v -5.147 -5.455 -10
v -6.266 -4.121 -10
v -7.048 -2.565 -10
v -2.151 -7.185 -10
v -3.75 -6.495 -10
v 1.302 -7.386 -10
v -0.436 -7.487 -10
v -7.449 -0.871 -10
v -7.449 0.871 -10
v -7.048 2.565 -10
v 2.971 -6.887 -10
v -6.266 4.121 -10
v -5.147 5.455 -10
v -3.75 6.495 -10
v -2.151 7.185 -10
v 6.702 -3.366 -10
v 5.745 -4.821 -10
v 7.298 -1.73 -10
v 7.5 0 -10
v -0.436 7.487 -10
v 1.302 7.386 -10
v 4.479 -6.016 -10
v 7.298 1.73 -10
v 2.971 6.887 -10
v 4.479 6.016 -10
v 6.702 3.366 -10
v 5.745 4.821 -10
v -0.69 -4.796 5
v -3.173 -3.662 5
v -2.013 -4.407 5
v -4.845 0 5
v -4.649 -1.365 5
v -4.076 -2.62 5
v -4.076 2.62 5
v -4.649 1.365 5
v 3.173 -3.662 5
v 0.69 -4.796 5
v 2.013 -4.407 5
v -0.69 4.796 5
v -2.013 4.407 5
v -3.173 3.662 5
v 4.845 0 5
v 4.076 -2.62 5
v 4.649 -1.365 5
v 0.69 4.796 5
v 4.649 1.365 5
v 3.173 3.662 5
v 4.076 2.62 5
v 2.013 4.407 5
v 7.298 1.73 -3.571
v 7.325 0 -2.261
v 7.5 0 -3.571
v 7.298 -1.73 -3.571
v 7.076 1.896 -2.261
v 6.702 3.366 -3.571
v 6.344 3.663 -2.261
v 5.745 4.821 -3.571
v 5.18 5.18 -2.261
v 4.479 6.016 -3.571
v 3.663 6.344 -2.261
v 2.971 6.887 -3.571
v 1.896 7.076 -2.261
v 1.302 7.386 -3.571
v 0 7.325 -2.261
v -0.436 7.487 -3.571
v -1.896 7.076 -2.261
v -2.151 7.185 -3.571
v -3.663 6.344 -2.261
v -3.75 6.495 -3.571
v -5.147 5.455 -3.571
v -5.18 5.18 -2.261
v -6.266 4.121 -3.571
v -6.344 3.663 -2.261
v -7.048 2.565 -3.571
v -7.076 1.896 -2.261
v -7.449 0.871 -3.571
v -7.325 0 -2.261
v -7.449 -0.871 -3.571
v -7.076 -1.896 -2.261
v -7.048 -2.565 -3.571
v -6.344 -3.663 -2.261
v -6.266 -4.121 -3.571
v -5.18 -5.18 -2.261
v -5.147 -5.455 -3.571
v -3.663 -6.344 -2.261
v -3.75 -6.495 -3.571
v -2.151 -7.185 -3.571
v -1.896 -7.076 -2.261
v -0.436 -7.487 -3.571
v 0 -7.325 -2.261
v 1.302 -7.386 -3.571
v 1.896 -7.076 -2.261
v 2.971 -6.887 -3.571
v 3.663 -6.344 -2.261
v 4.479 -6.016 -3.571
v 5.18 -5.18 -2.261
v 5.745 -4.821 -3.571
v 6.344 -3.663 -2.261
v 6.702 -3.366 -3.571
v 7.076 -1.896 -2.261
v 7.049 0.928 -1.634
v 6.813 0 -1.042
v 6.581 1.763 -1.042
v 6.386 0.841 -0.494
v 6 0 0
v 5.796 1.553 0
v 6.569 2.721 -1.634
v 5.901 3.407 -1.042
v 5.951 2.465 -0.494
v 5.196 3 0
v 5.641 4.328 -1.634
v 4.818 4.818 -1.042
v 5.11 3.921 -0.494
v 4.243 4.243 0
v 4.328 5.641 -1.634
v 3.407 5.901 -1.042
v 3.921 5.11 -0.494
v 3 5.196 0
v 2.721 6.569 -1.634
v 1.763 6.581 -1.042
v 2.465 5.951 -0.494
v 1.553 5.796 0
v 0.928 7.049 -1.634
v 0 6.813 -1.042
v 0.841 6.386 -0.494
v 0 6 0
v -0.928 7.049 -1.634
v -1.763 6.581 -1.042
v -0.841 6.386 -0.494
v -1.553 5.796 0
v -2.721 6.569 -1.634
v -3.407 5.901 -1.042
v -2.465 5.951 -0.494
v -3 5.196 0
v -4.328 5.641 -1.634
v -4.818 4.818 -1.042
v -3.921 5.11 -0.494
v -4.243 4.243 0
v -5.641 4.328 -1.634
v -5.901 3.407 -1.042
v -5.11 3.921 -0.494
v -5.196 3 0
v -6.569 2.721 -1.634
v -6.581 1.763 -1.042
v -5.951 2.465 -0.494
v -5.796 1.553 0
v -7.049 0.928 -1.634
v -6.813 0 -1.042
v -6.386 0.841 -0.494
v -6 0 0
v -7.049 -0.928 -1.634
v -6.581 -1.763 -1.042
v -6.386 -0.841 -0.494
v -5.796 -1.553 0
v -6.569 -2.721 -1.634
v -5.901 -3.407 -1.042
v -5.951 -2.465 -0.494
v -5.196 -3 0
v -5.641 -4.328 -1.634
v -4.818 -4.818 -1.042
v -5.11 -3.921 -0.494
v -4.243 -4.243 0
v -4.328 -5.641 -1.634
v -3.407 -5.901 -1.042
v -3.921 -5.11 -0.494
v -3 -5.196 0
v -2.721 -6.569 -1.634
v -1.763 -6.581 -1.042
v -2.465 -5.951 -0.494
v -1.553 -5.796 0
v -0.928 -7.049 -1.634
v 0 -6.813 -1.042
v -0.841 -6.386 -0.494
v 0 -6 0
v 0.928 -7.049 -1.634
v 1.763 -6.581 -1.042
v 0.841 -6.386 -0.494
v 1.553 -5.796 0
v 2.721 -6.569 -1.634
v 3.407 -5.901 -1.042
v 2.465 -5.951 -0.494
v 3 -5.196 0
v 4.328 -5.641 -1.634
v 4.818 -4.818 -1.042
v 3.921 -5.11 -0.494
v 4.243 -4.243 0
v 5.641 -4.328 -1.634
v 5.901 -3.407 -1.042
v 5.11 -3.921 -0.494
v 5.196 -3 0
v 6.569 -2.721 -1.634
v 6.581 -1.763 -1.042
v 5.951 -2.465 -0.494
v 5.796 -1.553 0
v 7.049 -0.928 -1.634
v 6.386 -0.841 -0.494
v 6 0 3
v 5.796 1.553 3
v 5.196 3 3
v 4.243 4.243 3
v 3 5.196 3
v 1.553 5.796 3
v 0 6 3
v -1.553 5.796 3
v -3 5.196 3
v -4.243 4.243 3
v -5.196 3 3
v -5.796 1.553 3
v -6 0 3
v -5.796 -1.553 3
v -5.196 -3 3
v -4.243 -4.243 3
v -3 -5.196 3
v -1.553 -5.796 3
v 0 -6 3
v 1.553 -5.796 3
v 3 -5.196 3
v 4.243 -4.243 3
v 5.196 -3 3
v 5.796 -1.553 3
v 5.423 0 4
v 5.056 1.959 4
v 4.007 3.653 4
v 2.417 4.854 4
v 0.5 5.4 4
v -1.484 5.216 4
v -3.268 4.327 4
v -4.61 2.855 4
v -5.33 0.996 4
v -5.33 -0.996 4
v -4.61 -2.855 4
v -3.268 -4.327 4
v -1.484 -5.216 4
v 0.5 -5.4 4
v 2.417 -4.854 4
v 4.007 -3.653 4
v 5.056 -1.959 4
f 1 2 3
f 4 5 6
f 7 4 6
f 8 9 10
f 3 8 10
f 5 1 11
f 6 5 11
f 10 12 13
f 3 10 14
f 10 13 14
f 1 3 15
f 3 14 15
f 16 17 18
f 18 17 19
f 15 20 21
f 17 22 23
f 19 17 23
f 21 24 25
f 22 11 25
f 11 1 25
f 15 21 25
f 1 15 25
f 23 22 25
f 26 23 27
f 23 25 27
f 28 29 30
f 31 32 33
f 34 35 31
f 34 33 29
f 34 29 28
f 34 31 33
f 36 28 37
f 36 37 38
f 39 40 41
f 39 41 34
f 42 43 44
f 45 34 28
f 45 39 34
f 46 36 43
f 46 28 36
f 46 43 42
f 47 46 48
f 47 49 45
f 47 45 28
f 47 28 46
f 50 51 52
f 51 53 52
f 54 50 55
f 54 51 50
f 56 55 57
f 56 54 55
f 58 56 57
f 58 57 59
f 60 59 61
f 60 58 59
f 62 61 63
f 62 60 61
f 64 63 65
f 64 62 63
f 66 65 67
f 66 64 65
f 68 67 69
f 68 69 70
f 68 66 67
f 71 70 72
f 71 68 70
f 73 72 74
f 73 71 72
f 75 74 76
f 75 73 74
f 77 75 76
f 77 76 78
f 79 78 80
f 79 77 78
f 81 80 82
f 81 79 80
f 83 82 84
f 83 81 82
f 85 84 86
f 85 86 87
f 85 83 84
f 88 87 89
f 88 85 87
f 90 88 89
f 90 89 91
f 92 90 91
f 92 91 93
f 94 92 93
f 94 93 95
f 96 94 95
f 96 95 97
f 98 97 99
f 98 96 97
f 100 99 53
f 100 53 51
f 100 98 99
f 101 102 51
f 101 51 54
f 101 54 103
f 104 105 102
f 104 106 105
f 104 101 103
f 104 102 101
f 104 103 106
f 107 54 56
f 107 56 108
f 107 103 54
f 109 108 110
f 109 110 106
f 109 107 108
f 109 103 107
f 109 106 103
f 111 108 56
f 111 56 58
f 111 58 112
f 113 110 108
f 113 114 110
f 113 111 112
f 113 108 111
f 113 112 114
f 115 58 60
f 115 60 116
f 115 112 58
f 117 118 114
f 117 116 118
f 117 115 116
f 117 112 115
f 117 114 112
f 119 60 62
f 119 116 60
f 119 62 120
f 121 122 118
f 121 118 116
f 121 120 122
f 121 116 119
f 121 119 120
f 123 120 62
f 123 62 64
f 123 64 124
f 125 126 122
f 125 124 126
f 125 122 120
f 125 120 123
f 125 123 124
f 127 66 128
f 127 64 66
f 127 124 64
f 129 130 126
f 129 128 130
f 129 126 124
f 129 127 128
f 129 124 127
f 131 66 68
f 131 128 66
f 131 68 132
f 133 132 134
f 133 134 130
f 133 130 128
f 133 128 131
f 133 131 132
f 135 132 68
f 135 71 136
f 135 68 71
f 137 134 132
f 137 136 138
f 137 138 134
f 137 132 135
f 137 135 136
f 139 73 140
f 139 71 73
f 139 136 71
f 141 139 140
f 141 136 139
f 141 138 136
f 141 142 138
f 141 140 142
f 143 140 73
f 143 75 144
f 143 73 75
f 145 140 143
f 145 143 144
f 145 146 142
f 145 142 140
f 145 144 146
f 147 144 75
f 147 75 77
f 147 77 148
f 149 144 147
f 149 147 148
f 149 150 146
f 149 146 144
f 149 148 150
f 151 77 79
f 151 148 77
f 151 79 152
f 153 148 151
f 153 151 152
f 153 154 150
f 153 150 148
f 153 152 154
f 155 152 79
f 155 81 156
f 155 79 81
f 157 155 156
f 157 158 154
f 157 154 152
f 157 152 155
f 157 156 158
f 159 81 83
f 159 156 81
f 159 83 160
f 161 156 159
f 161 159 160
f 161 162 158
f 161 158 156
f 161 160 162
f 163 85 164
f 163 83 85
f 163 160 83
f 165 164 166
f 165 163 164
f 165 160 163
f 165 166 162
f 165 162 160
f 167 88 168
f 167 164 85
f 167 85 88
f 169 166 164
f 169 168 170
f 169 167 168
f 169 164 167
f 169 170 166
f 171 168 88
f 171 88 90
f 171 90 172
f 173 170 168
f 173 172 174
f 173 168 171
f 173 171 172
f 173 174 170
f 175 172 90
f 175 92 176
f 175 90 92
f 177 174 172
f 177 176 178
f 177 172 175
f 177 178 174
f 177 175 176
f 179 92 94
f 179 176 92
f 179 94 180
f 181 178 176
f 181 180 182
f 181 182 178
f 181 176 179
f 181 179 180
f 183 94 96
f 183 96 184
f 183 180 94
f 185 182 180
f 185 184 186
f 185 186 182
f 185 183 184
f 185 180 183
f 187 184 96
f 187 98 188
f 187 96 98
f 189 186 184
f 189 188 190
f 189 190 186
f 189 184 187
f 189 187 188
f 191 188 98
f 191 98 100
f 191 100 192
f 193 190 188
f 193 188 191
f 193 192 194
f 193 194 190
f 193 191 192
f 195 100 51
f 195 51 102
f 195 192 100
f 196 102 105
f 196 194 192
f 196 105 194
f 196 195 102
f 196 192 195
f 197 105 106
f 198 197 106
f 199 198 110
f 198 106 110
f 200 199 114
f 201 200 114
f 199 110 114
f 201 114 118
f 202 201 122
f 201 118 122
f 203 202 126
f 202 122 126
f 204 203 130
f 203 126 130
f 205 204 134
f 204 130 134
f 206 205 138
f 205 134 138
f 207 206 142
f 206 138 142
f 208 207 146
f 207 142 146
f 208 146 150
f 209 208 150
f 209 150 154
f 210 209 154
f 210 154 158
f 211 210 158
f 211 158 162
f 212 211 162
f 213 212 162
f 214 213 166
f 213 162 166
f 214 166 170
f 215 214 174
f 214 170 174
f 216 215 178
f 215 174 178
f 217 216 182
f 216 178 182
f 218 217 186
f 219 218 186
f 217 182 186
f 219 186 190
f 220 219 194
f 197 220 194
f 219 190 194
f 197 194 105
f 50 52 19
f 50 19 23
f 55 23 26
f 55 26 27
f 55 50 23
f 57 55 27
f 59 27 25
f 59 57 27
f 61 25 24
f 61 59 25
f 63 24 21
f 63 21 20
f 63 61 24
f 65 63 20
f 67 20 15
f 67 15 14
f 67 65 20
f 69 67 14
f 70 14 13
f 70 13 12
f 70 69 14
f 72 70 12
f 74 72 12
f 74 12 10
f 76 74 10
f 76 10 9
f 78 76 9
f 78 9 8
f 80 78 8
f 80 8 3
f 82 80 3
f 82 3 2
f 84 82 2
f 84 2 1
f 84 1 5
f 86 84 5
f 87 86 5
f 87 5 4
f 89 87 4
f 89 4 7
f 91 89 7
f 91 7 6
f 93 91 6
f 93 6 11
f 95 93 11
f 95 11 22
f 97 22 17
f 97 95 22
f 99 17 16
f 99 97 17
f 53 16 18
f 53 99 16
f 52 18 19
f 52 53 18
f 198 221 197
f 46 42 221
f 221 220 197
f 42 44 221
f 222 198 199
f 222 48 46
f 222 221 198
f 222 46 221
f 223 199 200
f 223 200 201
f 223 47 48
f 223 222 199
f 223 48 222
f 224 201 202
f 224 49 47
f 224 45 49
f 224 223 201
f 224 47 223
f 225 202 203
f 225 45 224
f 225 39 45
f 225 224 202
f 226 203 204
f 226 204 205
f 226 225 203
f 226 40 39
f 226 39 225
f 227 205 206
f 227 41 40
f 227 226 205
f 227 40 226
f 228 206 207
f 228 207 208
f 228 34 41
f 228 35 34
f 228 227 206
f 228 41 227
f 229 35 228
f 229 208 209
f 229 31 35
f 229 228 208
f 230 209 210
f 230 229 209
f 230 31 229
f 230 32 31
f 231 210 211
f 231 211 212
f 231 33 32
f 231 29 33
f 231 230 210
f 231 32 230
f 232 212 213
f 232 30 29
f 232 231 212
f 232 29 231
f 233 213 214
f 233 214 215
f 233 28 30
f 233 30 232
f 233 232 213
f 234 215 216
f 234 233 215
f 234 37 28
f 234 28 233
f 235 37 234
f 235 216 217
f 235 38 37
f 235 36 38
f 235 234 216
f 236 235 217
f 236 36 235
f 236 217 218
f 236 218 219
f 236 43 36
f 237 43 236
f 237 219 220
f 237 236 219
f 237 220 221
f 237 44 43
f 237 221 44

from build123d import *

# Parameters (mm, degrees)
SZKIC1_R                    = 6
DODANIE_WYCI_GNI_CIE1_DEPTH = 5
SZKIC2_R                    = 7.5
DODANIE_WYCI_GNI_CIE2_DEPTH = 10
SFAZOWANIE1_SIZE            = 2
SFAZOWANIE1_SIZE2           = 1.154700538
ZAOKR_GLENIE1_R             = 5


with BuildPart() as part:
    # Szkic1 → Dodanie-wyciągnięcie1 (new body)
    with BuildSketch(Plane.XY):
        Circle(SZKIC1_R)
    extrude(amount=DODANIE_WYCI_GNI_CIE1_DEPTH)

    # Szkic2 → Dodanie-wyciągnięcie2 (add)
    with BuildSketch(Plane.XY):
        Circle(SZKIC2_R)
    extrude(amount=-DODANIE_WYCI_GNI_CIE2_DEPTH)

    # Sfazowanie1
    sfazowanie1_edges = [part.edges().sort_by_distance(p)[0] for p in [
        (-6, 0, 5),
    ]]
    sfazowanie1_side = [part.faces().sort_by_distance(p)[0] for p in [
        (-6, 0, 2.5),
    ]]
    chamfer(sfazowanie1_edges, length=SFAZOWANIE1_SIZE, length2=SFAZOWANIE1_SIZE2, reference=sfazowanie1_side[0])

    # Zaokrąglenie1
    # the kernel refuses this fillet: 5 mm, written as the material it takes off along each edge
    with BuildSketch(Plane(origin=(0, 0, 0), x_dir=(1, 0, 0), z_dir=(0, -1, 0))) as zaokr_glenie1_piece_1:
        with BuildLine():
            CenterArc((2.5, -3.570714214), ZAOKR_GLENIE1_R, 0, 45.572995999)
            Line((7.5, -3.570714214), (7.6, -3.570714214))
            Line((7.6, -3.570714214), (7.6, 0))
            Line((7.6, 0), (7.5, 0.1))
            ThreePointArc((7.5, 0.1), (6.75, 0.1), (6.07, 0.071414284))
            Line((6.07, 0.071414284), (6, 0))
        make_face()
    revolve(axis=Axis((0, 0, 0), (0, 0, 1)), mode=Mode.SUBTRACT)


solid = part.part
